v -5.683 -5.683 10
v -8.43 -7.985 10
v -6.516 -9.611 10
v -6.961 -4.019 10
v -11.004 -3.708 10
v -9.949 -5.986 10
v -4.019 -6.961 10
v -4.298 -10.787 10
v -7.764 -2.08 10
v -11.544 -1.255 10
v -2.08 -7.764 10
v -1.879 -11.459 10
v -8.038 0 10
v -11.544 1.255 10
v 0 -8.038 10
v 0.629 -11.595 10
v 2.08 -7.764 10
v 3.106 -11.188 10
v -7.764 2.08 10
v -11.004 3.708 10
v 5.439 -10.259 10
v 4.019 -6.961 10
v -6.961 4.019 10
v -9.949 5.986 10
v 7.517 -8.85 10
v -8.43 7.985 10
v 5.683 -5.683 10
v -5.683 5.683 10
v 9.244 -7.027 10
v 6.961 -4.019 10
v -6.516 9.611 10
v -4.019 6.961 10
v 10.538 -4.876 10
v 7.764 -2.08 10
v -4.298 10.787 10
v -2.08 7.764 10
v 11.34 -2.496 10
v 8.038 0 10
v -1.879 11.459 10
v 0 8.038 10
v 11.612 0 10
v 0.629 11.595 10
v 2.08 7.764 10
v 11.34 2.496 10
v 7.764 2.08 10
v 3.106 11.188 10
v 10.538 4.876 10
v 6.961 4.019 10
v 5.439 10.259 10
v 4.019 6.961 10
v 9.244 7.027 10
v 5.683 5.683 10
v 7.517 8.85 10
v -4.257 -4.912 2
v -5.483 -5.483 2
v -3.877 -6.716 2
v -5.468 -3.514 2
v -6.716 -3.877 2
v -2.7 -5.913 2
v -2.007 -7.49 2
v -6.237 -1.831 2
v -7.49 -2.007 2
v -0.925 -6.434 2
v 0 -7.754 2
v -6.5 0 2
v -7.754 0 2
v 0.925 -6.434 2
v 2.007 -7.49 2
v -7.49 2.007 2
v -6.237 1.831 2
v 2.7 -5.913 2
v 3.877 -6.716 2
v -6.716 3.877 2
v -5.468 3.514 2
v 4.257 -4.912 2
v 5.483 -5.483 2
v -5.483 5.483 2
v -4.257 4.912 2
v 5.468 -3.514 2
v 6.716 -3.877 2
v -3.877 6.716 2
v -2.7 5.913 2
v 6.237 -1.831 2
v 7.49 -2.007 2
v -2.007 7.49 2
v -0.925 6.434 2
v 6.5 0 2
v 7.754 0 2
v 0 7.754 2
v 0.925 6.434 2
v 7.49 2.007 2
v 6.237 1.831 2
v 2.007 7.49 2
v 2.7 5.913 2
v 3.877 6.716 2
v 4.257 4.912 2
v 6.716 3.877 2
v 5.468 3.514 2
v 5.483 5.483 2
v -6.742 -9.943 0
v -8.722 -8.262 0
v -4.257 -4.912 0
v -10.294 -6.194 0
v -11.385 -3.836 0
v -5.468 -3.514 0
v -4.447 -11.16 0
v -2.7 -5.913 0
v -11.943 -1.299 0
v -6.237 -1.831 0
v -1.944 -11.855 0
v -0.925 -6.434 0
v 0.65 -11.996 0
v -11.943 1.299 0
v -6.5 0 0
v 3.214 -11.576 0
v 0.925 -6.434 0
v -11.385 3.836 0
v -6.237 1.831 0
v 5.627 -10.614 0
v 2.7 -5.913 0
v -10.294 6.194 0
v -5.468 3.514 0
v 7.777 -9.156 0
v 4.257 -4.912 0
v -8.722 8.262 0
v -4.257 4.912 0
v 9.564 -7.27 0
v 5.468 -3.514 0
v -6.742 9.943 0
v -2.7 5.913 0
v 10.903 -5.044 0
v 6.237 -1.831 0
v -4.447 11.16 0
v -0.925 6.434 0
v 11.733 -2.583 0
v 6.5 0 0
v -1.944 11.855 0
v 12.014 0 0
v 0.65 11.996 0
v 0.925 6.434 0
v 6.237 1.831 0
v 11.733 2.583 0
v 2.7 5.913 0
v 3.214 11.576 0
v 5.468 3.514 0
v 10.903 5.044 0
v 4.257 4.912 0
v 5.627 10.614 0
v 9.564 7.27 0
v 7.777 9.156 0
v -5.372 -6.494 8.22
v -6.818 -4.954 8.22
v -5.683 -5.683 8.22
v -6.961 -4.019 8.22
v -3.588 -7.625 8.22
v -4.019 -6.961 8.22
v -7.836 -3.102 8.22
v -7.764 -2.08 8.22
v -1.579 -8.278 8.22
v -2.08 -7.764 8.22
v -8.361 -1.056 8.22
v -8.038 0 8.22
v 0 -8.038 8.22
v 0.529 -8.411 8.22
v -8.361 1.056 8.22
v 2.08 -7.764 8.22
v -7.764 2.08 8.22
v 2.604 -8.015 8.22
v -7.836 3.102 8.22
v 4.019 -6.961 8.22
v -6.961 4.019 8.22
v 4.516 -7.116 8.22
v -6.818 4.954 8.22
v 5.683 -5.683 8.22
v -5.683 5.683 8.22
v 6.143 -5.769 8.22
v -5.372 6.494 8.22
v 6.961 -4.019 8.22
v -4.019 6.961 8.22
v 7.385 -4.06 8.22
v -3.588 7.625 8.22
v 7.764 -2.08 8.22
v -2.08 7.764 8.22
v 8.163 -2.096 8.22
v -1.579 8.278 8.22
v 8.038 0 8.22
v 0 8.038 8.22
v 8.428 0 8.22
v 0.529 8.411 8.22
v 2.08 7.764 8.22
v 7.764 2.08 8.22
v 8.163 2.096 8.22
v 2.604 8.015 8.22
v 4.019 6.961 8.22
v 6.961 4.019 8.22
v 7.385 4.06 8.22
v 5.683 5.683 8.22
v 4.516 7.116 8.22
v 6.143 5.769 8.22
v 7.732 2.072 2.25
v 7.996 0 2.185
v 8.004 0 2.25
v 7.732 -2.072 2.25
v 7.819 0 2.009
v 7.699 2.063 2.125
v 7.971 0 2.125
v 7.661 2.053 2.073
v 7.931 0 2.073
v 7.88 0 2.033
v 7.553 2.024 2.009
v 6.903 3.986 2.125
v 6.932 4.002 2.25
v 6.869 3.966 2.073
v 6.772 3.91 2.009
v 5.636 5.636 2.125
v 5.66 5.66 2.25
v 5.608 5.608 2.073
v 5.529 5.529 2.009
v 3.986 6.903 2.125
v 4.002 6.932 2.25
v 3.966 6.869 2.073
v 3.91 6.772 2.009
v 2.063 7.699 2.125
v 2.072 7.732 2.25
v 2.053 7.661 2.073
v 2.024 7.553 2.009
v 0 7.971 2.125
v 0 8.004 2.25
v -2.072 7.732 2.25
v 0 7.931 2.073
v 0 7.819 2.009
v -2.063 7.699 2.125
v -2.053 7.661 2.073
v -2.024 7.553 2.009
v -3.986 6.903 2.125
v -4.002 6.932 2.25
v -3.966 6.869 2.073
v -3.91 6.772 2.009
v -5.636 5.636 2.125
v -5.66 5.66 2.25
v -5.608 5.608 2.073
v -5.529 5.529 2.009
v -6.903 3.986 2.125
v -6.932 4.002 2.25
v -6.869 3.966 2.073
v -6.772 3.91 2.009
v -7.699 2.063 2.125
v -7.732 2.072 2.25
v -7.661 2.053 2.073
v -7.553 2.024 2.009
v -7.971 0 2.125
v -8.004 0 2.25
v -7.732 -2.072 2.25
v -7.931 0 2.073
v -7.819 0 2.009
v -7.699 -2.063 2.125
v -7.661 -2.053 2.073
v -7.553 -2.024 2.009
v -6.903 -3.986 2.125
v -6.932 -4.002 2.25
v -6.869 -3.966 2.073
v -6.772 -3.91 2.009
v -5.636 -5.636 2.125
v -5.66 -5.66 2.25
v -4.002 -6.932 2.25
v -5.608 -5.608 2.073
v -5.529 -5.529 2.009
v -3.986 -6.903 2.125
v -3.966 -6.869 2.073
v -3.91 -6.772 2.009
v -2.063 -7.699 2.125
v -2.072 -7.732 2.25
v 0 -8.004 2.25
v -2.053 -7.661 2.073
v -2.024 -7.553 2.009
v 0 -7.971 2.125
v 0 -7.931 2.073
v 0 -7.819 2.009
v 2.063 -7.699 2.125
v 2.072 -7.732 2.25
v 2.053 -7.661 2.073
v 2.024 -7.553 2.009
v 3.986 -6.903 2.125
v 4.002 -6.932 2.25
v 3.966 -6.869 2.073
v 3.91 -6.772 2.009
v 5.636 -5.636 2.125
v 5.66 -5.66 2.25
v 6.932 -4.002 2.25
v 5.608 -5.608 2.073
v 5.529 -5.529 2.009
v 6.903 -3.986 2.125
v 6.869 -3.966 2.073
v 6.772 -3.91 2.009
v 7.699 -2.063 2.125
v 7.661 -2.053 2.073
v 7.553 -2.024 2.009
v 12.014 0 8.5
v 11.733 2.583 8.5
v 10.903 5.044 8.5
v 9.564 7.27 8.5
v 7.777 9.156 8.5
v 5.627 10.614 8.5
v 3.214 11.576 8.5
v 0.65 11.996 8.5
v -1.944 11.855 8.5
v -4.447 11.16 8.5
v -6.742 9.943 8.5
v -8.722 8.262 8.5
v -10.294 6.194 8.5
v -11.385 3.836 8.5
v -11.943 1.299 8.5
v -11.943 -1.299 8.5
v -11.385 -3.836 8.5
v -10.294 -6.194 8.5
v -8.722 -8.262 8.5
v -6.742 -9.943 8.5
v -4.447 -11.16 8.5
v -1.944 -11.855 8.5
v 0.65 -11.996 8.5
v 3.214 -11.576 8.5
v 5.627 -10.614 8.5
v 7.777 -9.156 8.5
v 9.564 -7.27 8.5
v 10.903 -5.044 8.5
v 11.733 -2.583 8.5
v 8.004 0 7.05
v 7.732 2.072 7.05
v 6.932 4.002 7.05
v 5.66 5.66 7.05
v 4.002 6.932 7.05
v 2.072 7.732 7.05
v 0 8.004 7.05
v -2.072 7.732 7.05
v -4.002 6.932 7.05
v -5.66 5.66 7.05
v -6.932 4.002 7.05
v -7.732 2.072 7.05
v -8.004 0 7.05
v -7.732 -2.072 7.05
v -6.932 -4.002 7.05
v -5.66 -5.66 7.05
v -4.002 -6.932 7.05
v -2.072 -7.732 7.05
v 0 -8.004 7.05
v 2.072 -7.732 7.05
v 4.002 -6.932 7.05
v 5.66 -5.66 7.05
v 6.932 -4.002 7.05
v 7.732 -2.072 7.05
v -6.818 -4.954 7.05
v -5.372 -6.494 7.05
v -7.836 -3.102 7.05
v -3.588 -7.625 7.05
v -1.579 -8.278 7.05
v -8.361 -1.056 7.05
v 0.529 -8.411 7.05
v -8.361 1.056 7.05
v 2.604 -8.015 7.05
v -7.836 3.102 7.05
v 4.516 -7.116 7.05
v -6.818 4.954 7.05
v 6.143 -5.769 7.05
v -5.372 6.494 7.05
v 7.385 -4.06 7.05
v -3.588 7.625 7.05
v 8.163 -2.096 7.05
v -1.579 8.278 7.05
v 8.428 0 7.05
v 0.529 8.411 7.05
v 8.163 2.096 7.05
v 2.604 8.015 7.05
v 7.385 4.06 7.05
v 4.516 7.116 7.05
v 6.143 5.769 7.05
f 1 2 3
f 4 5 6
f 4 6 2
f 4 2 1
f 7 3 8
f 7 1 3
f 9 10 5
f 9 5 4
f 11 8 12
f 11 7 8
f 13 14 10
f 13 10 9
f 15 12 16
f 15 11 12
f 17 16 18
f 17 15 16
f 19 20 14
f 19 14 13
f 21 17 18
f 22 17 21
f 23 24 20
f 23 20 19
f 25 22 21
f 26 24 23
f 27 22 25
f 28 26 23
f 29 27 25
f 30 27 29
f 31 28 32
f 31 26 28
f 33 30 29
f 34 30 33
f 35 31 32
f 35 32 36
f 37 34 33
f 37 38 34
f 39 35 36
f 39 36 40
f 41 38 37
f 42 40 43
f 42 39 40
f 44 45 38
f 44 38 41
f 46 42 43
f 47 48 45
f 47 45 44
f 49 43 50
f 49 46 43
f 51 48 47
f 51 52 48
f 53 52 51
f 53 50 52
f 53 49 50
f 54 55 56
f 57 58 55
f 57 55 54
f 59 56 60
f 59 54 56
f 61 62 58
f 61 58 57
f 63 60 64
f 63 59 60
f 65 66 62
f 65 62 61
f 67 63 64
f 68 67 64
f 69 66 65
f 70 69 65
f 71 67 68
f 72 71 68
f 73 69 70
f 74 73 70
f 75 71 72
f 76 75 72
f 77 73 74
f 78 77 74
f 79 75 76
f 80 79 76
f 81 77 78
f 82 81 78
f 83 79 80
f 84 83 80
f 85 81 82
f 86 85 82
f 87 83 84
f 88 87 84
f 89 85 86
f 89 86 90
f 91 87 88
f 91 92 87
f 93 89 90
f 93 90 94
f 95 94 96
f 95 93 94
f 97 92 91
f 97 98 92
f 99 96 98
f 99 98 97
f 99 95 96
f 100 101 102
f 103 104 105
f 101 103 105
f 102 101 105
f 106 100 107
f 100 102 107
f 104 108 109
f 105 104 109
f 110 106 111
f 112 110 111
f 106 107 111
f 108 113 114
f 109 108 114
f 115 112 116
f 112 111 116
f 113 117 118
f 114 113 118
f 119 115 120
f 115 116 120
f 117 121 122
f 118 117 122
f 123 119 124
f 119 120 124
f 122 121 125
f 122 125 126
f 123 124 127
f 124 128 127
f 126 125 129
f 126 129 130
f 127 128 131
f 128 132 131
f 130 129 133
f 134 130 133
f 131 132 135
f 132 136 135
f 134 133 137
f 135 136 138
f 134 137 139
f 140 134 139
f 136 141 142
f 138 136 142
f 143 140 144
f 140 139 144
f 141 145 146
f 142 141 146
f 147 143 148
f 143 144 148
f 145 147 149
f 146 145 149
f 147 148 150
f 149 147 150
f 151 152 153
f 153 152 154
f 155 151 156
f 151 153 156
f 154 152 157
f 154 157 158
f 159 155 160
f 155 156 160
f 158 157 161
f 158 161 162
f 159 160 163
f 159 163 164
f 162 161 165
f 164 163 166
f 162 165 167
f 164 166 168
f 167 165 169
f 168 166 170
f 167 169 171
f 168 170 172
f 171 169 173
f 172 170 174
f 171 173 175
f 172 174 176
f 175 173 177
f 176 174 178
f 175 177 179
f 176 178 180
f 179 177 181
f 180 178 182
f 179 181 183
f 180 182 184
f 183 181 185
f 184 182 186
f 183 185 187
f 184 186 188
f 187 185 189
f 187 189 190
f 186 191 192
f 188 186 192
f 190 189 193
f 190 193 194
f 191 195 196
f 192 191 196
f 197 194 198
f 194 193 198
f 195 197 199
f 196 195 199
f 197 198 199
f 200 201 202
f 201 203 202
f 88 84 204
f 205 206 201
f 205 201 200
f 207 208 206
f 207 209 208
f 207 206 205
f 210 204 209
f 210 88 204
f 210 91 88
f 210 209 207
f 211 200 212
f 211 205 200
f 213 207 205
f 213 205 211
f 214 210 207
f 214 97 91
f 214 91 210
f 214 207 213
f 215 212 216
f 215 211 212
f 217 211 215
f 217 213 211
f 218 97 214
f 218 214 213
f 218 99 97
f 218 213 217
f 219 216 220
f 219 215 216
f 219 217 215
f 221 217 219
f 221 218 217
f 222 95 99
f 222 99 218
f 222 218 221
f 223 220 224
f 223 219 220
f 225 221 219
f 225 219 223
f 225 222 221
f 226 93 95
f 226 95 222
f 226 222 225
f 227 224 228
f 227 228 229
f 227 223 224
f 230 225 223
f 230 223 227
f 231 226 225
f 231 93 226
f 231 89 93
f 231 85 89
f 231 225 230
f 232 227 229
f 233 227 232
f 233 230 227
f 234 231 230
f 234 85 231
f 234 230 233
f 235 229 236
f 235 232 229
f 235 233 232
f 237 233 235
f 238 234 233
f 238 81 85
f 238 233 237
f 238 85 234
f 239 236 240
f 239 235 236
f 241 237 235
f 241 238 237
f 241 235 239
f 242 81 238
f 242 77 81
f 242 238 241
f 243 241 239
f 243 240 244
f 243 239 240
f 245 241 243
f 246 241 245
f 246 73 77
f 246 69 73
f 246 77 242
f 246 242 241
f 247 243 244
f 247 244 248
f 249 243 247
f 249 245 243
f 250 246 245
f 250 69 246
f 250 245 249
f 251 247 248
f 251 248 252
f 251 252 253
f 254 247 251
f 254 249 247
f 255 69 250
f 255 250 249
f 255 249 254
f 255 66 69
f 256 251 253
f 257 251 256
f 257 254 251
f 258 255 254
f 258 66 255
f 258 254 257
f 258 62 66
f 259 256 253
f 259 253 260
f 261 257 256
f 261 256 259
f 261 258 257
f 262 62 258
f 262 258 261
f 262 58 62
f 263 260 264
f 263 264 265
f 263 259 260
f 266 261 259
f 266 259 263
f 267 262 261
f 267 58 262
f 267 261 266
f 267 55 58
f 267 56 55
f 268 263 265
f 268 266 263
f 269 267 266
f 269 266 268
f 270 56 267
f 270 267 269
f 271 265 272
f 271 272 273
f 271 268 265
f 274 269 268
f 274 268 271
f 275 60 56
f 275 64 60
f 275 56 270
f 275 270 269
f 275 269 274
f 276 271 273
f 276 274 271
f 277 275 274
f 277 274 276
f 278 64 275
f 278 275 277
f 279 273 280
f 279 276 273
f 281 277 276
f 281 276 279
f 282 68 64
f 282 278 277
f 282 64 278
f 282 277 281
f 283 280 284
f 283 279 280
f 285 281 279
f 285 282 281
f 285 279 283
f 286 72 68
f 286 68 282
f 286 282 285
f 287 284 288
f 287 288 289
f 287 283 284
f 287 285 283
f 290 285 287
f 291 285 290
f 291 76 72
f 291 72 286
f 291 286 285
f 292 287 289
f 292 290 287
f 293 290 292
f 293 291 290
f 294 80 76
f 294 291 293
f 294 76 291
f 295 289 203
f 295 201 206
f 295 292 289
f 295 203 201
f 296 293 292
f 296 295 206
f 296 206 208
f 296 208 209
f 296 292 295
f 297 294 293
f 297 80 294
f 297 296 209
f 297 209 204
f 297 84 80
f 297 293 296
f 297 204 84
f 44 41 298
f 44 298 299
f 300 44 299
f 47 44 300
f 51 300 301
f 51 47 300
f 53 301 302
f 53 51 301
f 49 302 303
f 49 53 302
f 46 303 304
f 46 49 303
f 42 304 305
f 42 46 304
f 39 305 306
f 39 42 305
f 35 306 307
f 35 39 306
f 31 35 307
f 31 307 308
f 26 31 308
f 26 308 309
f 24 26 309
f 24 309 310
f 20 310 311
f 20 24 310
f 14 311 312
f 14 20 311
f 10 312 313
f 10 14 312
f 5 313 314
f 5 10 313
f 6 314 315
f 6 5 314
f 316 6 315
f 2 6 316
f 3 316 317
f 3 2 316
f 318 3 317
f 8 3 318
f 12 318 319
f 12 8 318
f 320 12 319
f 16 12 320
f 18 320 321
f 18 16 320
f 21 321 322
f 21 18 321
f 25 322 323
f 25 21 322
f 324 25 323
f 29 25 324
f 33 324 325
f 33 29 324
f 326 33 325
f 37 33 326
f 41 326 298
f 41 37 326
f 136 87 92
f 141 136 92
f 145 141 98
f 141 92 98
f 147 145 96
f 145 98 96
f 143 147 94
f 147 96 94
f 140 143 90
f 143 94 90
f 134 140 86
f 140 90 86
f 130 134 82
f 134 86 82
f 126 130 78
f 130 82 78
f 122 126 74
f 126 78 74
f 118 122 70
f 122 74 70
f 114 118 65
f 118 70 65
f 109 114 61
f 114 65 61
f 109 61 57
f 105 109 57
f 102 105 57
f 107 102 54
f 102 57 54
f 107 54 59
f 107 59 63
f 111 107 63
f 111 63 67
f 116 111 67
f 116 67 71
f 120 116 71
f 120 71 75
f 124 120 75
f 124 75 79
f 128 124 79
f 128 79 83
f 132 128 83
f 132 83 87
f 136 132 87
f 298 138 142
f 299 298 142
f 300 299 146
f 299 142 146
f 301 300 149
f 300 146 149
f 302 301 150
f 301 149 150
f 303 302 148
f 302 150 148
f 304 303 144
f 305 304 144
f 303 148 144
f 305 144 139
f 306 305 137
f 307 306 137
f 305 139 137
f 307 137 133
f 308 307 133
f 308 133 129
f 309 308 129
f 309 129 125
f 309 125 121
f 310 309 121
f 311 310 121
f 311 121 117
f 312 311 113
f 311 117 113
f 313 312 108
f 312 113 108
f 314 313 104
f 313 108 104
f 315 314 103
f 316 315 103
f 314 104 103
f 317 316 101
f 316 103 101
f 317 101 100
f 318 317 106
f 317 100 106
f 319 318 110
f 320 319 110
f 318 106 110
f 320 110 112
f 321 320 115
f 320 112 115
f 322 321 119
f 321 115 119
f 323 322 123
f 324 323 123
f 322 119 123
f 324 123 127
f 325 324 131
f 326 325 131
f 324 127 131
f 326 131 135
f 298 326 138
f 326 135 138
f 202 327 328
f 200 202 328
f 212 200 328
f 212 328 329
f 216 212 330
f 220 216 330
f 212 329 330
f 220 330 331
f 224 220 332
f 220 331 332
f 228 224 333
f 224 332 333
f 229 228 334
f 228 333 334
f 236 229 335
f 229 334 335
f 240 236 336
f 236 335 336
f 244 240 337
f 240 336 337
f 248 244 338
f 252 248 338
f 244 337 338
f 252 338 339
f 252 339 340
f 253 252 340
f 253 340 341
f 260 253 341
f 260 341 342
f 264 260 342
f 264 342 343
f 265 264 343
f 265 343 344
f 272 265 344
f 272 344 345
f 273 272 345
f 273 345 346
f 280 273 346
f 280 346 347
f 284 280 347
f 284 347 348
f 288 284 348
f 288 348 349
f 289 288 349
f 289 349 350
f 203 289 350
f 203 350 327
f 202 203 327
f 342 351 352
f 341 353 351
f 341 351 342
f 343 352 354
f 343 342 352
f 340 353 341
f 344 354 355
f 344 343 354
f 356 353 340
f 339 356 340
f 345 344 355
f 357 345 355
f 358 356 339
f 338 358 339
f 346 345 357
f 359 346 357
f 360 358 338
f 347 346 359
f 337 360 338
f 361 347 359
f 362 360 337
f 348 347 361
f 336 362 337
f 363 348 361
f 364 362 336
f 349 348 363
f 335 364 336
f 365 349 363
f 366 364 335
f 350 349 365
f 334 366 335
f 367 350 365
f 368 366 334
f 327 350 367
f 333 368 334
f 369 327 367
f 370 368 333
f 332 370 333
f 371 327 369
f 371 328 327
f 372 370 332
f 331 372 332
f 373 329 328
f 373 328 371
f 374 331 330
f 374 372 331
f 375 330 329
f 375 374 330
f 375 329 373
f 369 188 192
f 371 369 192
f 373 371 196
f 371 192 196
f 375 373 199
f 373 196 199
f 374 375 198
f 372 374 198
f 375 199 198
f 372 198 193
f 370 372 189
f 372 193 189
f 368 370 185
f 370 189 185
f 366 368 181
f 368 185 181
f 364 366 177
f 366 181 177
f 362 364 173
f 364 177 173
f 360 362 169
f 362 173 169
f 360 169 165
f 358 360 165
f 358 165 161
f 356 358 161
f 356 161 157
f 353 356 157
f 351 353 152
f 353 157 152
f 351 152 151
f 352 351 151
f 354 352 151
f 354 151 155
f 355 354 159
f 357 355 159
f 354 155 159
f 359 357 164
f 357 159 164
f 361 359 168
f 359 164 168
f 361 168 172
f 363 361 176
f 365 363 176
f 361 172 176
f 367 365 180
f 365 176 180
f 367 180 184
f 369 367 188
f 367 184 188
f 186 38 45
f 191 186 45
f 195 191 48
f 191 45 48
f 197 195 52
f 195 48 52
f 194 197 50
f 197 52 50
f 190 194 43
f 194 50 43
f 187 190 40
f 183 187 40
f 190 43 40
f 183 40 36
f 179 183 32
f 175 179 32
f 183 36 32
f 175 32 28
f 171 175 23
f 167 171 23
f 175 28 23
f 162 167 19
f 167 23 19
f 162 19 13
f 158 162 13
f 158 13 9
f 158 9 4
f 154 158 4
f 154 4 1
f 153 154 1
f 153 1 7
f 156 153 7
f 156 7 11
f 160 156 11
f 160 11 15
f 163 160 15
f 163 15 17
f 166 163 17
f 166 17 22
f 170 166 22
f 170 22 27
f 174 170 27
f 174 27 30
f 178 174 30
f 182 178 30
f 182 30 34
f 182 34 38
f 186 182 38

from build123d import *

# Parameters (mm, degrees)
SKETCH1_R      = 12.0135
EXTRUDE1_DEPTH = 10
SKETCH3_R      = 8.0045
EXTRUDE2_DEPTH = 8
SKETCH4_R      = 6.5
EXTRUDE3_DEPTH = 19.778934062
FILLET1_R      = 0.25
EXTRUDE4_START = -1.78
SKETCH5_R      = 8.4275
EXTRUDE4_DEPTH = 1.17
EXTRUDE5_REACH = 21.714
SKETCH6_R      = 8.0375
CHAMFER2_SIZE  = 1.5
CHAMFER2_SIZE2 = 0.401923789


with BuildPart() as part:
    # Sketch1 → Extrude1 (new body)
    with BuildSketch(Plane.XY):
        Circle(SKETCH1_R)
    extrude(amount=EXTRUDE1_DEPTH)

    # Sketch3 → Extrude2 (cut)
    with BuildSketch(Plane.XY.offset(10)):
        Circle(SKETCH3_R)
    extrude(amount=-EXTRUDE2_DEPTH, mode=Mode.SUBTRACT)

    # Sketch4 → Extrude3 (cut, through all)
    with BuildSketch(Plane.XY.offset(2)):
        Circle(SKETCH4_R)
    extrude(amount=-EXTRUDE3_DEPTH, mode=Mode.SUBTRACT)

    # Fillet1
    fillet1_edges = [part.edges().sort_by_distance(p)[0] for p in [
        (-8.0045, 0, 2),
    ]]
    fillet(fillet1_edges, radius=FILLET1_R)

    # Sketch5 → Extrude4 (cut)
    with BuildSketch(Plane.XY.offset(10).offset(EXTRUDE4_START)):
        Circle(SKETCH5_R)
    extrude(amount=-EXTRUDE4_DEPTH, mode=Mode.SUBTRACT)

    # Sketch6 → Extrude5 (cut, up to next)
    with BuildSketch(Plane.XY.offset(10), mode=Mode.PRIVATE) as extrude5_sk1:
        Circle(SKETCH6_R)
    extrude5_tool1 = extrude(extrude5_sk1.sketch, amount=-EXTRUDE5_REACH, mode=Mode.PRIVATE) & part.part
    add(extrude5_tool1.solids().sort_by_distance((0, 0, 10))[0], mode=Mode.SUBTRACT)

    # Chamfer2
    chamfer2_edges = [part.edges().sort_by_distance(p)[0] for p in [
        (-12.0135, 0, 10),
    ]]
    chamfer2_side = [part.faces().sort_by_distance(p)[0] for p in [
        (-12.0135, 0, 5),
    ]]
    chamfer(chamfer2_edges, length=CHAMFER2_SIZE, length2=CHAMFER2_SIZE2, reference=chamfer2_side[0])


solid = part.part
